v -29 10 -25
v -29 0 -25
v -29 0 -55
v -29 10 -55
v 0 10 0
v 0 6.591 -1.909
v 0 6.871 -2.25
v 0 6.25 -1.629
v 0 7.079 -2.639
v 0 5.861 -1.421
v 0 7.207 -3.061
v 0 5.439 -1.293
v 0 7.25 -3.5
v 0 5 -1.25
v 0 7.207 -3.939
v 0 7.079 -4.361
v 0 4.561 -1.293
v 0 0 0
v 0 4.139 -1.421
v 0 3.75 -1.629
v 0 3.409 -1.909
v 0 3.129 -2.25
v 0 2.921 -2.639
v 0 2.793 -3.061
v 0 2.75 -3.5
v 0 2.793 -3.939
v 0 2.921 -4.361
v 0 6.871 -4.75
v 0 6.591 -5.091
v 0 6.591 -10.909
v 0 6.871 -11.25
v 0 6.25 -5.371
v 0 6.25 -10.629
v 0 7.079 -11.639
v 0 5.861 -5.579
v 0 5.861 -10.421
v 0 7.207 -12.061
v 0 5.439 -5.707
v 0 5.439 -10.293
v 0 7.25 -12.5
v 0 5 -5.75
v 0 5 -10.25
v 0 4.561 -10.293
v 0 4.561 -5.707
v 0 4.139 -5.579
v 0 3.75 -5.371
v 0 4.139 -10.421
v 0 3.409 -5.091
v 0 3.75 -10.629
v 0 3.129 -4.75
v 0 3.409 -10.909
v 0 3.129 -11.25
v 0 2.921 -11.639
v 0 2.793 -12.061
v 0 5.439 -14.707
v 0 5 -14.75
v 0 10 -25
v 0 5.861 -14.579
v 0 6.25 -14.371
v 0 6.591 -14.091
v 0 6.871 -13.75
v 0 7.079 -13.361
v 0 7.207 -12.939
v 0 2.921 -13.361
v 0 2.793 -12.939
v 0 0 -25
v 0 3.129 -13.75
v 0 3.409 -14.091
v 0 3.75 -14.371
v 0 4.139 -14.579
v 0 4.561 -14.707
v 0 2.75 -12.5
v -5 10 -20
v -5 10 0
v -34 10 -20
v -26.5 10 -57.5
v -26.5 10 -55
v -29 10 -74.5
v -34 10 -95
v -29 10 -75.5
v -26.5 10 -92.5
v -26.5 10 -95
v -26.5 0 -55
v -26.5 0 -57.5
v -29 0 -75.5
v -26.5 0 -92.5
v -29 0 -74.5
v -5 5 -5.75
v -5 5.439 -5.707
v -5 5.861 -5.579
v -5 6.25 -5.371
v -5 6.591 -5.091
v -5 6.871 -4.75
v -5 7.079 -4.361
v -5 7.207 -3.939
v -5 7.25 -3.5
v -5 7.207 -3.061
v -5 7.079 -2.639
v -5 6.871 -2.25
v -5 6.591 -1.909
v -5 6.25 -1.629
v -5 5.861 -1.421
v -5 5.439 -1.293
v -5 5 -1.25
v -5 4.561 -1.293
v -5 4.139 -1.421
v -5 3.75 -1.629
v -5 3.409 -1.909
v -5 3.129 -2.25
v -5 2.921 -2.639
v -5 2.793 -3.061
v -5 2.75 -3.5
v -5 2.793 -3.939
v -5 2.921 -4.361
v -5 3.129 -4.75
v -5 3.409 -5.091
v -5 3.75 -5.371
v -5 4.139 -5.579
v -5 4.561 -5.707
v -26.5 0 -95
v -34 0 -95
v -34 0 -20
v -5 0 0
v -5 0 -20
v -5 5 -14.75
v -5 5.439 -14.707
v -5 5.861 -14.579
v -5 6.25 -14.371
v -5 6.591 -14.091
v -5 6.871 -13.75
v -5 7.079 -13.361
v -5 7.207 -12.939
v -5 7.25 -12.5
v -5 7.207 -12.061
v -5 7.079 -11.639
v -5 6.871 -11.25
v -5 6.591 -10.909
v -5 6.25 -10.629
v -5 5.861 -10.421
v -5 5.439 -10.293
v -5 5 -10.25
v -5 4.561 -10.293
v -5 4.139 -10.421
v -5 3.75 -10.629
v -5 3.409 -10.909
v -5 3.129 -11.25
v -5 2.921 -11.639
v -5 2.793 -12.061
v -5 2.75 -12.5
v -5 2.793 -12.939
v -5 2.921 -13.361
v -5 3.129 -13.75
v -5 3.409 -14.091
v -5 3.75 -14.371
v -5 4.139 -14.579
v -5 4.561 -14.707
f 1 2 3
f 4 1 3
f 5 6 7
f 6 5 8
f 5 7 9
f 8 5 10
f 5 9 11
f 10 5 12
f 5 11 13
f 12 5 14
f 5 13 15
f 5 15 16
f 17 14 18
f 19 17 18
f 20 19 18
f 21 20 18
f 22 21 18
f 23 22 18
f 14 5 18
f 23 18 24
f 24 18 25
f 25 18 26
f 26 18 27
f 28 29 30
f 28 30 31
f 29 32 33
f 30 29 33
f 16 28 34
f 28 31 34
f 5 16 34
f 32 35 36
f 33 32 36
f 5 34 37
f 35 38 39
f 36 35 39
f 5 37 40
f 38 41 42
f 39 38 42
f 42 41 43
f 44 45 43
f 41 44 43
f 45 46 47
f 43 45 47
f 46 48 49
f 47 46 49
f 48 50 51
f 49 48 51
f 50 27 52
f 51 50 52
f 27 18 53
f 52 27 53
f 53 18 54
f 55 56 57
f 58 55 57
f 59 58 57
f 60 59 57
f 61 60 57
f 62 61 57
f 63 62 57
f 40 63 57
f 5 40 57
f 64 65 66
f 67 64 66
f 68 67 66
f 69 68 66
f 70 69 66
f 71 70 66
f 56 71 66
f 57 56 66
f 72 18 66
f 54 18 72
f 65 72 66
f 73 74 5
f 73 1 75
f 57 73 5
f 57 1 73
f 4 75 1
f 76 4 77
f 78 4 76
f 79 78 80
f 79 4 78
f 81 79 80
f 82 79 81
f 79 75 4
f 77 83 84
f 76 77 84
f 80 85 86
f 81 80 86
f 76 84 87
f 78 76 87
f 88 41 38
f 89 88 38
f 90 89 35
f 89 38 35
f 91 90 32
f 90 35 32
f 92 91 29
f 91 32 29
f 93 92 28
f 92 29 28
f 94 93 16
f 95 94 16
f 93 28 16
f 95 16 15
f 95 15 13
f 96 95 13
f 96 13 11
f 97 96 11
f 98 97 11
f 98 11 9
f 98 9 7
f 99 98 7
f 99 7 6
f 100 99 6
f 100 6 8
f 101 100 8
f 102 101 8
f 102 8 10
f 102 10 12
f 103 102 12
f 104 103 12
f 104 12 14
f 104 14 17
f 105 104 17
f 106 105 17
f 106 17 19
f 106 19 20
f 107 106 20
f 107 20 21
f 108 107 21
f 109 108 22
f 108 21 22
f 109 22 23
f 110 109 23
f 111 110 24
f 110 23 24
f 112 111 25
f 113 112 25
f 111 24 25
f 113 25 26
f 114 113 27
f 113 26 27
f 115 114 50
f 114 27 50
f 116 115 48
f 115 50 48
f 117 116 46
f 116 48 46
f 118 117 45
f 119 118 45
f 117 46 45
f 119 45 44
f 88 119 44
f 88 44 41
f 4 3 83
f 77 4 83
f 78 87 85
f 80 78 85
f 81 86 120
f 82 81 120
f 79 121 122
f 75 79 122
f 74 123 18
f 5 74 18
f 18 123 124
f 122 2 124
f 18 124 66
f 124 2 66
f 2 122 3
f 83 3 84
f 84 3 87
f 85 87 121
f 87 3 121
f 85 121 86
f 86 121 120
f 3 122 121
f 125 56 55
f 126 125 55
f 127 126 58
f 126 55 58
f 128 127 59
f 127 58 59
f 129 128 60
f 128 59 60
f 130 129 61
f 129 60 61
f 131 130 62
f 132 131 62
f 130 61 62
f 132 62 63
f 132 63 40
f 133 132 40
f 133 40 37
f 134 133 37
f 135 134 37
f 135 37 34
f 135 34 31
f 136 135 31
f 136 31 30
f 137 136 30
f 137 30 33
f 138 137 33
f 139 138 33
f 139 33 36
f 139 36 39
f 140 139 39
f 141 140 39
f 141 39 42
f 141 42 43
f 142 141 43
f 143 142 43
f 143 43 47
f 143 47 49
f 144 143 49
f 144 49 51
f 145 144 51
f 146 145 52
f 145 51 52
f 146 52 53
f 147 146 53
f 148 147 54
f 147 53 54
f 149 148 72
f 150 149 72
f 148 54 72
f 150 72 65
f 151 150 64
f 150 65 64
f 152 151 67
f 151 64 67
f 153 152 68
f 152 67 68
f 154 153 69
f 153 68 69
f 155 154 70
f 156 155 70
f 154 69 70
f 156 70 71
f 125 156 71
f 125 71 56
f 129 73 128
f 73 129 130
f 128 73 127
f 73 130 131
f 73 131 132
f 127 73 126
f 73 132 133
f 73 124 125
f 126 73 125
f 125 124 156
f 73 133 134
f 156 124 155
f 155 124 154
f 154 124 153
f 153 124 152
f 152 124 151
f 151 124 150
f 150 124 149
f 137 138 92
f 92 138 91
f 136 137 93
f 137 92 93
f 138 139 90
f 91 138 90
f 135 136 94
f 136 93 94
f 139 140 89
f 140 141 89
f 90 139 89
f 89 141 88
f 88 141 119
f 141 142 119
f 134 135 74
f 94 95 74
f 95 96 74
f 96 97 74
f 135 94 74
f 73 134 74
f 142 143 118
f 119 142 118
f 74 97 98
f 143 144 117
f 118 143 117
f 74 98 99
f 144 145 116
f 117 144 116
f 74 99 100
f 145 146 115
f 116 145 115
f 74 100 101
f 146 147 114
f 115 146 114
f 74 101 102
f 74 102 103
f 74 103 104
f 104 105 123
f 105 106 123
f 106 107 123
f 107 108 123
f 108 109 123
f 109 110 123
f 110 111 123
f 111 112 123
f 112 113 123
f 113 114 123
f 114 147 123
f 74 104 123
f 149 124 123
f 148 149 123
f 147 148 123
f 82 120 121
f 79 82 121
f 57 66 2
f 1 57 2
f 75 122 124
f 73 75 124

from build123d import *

# Parameters (mm, degrees)
BOSS_EXTRUDE1_DEPTH = 10
SKETCH3_R           = 2.25
CUT_EXTRUDE1_DEPTH  = 35


with BuildPart() as part:
    # Sketch2 → Boss-Extrude1 (new body)
    with BuildSketch(Plane(origin=(0, 0, 0), x_dir=(1, 0, 0), z_dir=(0, 1, 0))):
        Polygon((-5, 0), (0, 0), (0, 25), (-29, 25), (-29, 55), (-26.5, 55), (-26.5, 57.5), (-29, 74.5), (-29, 75.5), (-26.5, 92.5), (-26.5, 95), (-34, 95), (-34, 20), (-5, 20), align=None)
    extrude(amount=BOSS_EXTRUDE1_DEPTH)

    # Sketch3 → Cut-Extrude1 (cut, through all)
    with BuildSketch(Plane(origin=(0, 0, 0), x_dir=(0, 0, -1), z_dir=(1, 0, 0))):
        with Locations((3.5, 5)):
            Circle(SKETCH3_R)
        with Locations((12.5, 5)):
            Circle(SKETCH3_R)
    extrude(amount=-CUT_EXTRUDE1_DEPTH, mode=Mode.SUBTRACT)


solid = part.part
